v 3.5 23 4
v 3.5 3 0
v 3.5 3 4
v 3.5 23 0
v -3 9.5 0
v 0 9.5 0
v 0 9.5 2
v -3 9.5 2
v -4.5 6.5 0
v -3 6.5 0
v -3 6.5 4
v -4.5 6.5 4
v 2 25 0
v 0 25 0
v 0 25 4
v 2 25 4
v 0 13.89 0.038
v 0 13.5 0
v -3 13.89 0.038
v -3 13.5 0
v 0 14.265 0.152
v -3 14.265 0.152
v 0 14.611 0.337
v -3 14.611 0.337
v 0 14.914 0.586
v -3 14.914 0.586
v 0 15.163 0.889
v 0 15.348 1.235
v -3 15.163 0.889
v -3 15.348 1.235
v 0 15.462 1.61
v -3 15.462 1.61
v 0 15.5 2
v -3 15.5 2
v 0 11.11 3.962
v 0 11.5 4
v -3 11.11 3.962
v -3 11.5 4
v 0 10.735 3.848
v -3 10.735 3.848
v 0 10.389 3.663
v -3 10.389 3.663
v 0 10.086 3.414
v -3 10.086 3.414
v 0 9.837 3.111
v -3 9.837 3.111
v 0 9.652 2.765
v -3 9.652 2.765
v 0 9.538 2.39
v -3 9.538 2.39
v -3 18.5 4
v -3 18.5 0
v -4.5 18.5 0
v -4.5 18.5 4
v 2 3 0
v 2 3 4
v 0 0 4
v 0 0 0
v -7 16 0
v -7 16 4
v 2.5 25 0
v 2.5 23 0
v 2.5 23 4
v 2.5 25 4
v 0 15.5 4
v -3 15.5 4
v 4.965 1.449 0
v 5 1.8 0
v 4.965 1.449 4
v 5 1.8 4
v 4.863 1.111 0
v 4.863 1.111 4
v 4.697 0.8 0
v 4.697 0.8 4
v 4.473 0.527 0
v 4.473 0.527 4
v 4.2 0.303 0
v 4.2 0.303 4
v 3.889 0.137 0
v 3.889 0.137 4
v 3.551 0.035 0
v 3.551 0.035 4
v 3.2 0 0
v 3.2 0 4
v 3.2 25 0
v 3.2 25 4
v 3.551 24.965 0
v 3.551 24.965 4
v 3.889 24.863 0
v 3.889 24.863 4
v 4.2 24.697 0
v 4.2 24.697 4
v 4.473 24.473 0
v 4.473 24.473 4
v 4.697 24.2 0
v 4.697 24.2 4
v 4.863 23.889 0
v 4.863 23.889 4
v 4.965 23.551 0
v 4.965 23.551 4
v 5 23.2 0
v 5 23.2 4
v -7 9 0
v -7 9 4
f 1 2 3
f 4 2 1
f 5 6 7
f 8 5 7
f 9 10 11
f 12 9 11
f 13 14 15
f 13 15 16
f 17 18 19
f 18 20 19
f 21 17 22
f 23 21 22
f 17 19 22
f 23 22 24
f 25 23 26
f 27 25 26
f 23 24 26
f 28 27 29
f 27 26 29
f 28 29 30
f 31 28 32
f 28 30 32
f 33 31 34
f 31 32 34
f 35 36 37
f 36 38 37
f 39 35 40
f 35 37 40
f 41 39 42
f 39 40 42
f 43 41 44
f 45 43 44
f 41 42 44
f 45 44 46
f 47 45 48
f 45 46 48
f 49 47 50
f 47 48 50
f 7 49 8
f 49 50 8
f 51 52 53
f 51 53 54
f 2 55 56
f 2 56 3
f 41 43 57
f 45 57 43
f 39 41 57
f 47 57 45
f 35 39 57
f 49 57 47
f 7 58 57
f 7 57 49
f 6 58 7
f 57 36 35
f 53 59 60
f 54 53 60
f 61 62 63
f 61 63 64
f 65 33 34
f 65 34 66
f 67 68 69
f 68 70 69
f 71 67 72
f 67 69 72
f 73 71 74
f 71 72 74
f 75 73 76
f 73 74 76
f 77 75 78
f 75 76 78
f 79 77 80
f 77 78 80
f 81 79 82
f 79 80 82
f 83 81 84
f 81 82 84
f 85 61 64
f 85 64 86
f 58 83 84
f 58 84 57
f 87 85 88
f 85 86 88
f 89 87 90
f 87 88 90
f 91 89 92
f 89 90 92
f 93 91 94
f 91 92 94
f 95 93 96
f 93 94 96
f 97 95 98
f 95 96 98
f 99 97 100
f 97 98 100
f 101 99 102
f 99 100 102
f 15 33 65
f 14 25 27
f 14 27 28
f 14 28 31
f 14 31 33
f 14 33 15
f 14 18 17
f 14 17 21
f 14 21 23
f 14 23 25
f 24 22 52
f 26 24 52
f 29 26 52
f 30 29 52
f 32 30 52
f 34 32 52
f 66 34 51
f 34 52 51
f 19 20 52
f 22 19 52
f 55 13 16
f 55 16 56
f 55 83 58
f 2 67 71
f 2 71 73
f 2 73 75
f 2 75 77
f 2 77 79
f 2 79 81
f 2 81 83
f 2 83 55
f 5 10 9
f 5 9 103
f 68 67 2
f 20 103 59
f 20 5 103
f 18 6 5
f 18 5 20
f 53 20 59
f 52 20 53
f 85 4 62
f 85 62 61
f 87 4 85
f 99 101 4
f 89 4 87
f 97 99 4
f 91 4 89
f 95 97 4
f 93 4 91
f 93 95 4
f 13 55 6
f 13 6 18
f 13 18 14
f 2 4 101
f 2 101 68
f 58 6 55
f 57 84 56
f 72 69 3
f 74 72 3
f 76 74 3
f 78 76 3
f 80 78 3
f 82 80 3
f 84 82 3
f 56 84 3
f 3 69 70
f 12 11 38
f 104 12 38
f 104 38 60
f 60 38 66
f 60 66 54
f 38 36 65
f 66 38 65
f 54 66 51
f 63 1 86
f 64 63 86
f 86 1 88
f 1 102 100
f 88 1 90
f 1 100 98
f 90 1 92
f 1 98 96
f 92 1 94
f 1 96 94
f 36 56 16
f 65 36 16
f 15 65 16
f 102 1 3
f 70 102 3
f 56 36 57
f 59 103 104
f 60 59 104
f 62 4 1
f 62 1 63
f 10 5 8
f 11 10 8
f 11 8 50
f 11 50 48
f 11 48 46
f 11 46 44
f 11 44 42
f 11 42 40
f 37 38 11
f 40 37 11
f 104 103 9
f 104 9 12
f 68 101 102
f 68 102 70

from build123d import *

# Parameters (mm, degrees)
DODANIE_WYCI_GNI_CIE1_DEPTH = 4
ZAOKR_GLENIE1_R             = 1.8
SZKIC2_W                    = 4
SZKIC2_H                    = 6
DODANIE_WYCI_GNI_CIE2_DEPTH = 3
ZAOKR_GLENIE2_R             = 2
SZKIC3_W                    = 4
SZKIC3_H                    = 12
DODANIE_WYCI_GNI_CIE3_DEPTH = 4
SFAZOWANIE1_SIZE            = 2.5


with BuildPart() as part:
    # Szkic1 → Dodanie-wyciągnięcie1 (new body)
    with BuildSketch(Plane.XY):
        Polygon((0, 0), (0, 25), (2, 25), (2, 3), (3.5, 3), (3.5, 23), (2.5, 23), (2.5, 25), (5, 25), (5, 0), align=None)
    extrude(amount=DODANIE_WYCI_GNI_CIE1_DEPTH)

    # Zaokrąglenie1
    zaokr_glenie1_edges = [part.edges().sort_by_distance(p)[0] for p in [
        (5, 25, 2),
        (5, 0, 2),
    ]]
    fillet(zaokr_glenie1_edges, radius=ZAOKR_GLENIE1_R)

    # Szkic2 → Dodanie-wyciągnięcie2 (add)
    with BuildSketch(Plane.ZY):
        with Locations((2, 12.5)):
            Rectangle(SZKIC2_W, SZKIC2_H)
    extrude(amount=DODANIE_WYCI_GNI_CIE2_DEPTH)

    # Zaokrąglenie2
    zaokr_glenie2_edges = [part.edges().sort_by_distance(p)[0] for p in [
        (-1.5, 15.5, 0),
        (-1.5, 9.5, 4),
    ]]
    fillet(zaokr_glenie2_edges, radius=ZAOKR_GLENIE2_R)

    # Szkic3 → Dodanie-wyciągnięcie3 (add)
    with BuildSketch(Plane.ZY.offset(3)):
        with Locations((2, 12.5)):
            Rectangle(SZKIC3_W, SZKIC3_H)
    extrude(amount=DODANIE_WYCI_GNI_CIE3_DEPTH)

    # Sfazowanie1
    sfazowanie1_edges = [part.edges().sort_by_distance(p)[0] for p in [
        (-7, 6.5, 2),
        (-7, 18.5, 2),
    ]]
    chamfer(sfazowanie1_edges, length=SFAZOWANIE1_SIZE)


solid = part.part
